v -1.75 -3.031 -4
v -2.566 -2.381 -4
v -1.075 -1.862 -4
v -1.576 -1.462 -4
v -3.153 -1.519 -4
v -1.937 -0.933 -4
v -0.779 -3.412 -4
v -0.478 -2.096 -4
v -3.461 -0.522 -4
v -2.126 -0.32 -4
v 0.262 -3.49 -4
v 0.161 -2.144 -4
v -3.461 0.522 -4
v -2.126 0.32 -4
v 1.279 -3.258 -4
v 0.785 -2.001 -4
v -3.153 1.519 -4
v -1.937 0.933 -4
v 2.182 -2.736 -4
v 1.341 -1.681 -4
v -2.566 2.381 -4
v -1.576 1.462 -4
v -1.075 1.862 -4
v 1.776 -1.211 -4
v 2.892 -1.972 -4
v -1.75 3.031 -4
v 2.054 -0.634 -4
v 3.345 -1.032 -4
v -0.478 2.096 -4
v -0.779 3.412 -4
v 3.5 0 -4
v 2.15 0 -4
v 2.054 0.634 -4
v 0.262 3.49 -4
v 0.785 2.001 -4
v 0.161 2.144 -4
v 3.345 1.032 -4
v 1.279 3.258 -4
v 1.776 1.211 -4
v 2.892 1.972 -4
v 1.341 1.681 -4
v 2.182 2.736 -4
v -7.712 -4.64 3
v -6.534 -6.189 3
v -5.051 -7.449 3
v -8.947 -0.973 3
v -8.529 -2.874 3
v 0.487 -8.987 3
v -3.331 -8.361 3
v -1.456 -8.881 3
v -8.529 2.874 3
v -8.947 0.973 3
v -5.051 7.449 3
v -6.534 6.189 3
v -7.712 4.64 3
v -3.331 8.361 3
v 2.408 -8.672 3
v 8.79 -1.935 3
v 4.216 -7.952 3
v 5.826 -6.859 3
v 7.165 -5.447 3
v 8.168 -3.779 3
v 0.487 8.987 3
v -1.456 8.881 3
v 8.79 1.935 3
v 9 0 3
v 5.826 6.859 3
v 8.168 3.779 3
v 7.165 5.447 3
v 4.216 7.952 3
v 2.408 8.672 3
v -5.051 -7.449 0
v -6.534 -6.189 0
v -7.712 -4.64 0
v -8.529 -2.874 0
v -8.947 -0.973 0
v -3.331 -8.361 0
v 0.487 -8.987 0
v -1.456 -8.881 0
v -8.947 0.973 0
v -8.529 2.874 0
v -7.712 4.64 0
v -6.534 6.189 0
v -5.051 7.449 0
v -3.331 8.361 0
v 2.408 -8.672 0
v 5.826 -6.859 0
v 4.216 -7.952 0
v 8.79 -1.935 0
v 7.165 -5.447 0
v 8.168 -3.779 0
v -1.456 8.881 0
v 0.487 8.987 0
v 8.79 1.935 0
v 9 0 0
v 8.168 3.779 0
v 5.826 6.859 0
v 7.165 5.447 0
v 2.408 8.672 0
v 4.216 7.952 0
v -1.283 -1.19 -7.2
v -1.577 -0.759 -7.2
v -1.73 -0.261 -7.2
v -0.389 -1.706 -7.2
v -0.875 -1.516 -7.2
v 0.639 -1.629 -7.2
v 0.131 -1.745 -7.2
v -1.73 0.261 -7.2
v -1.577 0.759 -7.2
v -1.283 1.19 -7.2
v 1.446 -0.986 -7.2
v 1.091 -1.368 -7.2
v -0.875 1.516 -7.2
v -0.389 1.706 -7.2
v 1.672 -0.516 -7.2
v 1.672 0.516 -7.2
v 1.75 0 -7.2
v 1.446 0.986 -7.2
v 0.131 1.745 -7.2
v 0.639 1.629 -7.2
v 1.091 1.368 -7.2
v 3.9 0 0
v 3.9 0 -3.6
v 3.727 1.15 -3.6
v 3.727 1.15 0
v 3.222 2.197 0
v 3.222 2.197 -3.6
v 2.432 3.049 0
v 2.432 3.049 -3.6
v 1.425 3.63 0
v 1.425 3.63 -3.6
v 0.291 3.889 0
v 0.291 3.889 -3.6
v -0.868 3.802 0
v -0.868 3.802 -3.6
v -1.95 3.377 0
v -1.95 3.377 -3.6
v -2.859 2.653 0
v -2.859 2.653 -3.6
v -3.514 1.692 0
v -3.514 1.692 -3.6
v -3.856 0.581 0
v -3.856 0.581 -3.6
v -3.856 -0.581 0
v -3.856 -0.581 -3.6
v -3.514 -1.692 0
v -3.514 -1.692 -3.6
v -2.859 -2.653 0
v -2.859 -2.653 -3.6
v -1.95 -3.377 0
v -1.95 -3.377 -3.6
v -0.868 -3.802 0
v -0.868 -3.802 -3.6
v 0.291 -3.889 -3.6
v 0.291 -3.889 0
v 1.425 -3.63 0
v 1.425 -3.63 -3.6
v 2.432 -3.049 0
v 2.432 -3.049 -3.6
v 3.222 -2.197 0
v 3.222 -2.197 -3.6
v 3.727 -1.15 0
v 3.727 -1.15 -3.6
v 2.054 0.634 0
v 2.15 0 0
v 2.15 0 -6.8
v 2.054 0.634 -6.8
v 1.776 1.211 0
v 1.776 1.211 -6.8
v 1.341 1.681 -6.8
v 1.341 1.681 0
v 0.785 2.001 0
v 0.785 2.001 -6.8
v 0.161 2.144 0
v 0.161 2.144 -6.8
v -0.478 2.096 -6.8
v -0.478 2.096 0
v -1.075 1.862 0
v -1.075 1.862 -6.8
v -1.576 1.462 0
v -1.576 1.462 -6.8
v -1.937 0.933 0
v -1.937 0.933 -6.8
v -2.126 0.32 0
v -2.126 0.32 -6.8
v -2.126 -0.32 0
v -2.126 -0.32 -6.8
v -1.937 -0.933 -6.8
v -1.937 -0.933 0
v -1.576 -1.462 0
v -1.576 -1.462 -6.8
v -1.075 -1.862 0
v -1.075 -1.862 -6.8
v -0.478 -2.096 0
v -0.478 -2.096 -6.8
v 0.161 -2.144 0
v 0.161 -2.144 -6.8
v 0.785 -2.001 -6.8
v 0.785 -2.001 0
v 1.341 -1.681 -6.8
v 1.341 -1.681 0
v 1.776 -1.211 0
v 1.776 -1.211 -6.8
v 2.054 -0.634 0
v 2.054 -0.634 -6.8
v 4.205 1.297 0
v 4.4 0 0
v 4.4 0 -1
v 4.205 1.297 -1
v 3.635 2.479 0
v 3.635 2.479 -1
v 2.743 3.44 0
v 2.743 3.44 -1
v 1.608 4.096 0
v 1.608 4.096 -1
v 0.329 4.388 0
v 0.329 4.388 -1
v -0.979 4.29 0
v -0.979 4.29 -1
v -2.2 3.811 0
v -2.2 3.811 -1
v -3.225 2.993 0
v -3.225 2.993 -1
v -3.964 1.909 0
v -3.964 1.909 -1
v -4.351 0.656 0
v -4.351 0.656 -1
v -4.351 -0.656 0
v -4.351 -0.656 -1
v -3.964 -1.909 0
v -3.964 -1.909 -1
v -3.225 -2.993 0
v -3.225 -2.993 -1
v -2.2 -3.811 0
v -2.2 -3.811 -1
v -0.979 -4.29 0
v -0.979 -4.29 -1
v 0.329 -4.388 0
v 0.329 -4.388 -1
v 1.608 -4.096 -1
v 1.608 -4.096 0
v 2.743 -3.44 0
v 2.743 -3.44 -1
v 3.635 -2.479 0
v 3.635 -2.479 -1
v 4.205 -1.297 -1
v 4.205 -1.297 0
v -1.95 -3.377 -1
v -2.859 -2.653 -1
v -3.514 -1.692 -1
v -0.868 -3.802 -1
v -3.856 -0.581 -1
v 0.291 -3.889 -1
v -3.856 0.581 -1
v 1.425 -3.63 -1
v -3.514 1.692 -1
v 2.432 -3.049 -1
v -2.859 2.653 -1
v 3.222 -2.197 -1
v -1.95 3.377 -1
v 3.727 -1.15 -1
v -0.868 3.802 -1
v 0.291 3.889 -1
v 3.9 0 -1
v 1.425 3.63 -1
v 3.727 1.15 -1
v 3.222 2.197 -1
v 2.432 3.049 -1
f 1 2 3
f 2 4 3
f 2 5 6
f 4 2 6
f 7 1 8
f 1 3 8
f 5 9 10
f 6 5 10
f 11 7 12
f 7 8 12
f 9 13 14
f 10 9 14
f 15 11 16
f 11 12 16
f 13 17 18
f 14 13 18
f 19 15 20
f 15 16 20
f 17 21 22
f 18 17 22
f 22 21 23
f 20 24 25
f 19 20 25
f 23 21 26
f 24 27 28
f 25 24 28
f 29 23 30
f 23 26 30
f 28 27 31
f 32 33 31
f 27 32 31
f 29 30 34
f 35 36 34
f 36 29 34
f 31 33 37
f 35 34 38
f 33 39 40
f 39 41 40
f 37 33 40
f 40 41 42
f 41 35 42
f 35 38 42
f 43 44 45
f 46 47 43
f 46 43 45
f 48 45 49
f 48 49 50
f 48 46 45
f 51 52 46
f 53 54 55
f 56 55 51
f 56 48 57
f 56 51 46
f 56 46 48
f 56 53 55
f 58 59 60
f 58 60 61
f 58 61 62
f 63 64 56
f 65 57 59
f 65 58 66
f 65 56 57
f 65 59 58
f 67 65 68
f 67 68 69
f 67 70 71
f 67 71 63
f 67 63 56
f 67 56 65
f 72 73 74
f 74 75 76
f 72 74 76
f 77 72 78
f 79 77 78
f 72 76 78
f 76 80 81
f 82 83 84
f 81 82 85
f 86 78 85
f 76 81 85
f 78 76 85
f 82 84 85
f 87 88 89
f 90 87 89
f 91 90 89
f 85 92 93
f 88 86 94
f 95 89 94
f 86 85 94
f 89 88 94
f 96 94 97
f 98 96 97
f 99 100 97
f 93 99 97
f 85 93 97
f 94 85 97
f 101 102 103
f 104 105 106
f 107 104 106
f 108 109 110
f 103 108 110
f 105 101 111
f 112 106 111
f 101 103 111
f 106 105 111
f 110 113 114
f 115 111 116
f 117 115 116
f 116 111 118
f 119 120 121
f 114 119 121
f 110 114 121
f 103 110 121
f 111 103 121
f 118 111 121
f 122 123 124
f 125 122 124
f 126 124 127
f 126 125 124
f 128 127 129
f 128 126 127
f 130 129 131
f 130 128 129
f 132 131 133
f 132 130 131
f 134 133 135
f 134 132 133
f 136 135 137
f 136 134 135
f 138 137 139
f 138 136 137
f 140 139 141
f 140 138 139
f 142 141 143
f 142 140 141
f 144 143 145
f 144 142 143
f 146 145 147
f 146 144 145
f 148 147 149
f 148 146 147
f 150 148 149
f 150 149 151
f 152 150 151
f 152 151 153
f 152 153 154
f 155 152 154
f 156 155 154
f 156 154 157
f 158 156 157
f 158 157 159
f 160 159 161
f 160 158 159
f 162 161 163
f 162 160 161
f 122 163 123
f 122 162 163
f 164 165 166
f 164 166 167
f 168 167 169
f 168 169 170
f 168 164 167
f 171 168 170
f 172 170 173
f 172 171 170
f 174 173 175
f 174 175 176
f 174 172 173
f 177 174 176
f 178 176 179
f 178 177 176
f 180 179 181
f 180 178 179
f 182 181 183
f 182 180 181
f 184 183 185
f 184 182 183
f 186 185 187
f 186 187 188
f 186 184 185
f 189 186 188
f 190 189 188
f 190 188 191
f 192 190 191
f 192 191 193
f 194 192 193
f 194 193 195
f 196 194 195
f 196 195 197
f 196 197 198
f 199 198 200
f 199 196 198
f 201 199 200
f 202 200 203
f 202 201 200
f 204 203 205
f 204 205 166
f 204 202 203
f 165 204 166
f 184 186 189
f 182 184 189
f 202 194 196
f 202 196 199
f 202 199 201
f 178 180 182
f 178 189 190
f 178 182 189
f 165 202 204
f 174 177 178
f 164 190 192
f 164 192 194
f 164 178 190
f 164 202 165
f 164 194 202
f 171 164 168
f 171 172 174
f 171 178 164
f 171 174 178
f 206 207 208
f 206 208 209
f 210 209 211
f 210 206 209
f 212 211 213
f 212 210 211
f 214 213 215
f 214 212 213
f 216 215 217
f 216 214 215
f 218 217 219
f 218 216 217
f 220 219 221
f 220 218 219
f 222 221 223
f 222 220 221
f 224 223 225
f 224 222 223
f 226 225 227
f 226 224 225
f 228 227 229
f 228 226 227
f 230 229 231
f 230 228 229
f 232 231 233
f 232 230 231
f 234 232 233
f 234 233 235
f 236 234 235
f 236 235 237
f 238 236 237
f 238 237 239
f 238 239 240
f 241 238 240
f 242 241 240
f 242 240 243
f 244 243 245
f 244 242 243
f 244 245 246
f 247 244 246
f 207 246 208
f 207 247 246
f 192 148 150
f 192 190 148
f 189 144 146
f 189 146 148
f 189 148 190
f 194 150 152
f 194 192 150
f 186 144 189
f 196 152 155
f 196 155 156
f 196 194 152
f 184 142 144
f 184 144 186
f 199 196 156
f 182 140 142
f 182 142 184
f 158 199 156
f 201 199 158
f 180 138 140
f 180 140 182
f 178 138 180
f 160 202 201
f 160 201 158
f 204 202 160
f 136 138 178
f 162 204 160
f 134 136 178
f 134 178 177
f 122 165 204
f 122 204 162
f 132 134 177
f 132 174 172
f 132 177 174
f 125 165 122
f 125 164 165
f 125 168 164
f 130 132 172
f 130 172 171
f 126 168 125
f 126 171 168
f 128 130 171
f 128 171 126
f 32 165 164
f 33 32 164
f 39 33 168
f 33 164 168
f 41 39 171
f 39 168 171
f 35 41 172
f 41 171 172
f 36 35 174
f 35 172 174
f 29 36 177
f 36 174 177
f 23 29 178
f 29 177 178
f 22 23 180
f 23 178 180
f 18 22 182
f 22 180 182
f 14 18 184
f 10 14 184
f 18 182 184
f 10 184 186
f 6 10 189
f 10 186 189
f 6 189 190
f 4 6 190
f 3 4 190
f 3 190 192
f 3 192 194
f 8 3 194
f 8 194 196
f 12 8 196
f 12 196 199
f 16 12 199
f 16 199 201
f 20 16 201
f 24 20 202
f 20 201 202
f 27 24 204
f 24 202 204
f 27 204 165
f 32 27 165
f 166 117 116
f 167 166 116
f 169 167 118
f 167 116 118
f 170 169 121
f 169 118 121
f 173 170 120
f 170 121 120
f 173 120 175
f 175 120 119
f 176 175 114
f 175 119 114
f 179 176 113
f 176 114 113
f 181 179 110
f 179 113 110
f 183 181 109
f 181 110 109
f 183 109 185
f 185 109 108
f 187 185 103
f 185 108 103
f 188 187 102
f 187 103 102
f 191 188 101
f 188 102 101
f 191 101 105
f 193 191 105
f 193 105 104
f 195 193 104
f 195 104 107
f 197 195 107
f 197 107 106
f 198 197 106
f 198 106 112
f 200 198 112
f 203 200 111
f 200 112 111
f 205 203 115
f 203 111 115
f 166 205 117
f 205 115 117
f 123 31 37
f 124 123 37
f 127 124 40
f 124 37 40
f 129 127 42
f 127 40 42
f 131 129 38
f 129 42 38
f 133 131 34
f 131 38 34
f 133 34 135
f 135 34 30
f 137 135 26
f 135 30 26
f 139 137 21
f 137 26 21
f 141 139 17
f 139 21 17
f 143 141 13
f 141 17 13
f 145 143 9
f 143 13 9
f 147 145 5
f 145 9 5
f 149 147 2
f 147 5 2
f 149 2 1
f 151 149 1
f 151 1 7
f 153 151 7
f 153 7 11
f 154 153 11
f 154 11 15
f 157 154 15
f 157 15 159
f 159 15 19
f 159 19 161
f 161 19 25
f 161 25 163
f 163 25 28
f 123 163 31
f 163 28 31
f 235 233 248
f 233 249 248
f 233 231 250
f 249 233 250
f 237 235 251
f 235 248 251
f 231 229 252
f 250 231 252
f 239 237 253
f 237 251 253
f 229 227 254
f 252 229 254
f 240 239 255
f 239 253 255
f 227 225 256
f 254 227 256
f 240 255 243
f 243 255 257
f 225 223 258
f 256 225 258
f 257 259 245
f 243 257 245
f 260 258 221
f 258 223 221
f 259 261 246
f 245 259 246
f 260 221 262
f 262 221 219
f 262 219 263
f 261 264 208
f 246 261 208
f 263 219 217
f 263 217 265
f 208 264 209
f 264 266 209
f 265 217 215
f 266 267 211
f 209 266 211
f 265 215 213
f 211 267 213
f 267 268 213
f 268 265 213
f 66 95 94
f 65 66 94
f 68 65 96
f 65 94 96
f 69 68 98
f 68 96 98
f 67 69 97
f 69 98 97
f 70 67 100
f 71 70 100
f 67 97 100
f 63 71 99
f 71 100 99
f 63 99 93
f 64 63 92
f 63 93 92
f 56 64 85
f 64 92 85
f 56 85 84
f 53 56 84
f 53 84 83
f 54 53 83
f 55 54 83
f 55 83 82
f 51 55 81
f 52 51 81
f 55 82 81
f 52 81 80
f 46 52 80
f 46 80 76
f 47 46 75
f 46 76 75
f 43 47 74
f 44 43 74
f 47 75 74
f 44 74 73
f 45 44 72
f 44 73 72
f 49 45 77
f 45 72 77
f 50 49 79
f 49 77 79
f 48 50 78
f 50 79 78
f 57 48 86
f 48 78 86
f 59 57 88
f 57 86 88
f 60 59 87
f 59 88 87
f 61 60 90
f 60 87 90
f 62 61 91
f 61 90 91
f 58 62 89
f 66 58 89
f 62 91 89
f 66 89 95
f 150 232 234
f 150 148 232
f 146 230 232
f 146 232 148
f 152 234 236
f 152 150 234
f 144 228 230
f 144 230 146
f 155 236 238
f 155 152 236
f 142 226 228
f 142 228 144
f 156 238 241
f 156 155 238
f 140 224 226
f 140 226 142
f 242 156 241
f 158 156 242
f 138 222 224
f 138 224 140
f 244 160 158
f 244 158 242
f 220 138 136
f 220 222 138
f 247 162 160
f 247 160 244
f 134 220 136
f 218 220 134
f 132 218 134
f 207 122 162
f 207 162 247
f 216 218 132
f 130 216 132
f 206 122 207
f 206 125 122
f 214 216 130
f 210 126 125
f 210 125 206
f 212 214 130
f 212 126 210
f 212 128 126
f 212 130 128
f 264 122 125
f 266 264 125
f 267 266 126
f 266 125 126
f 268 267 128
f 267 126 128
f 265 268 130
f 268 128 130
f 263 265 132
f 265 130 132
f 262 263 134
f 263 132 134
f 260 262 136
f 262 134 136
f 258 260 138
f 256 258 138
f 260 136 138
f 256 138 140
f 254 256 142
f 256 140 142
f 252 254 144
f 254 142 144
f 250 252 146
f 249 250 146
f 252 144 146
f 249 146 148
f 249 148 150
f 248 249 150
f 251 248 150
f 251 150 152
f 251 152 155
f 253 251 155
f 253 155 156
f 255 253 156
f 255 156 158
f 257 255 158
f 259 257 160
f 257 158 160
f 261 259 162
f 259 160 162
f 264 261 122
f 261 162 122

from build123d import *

# Parameters (mm, degrees)
F0_R      = 4.4
F0_R_2    = 3.9
F1_DEPTH  = 1
F0_R_3    = 2.15
F2_DEPTH  = 4
F3_DEPTH  = 7.2
F4_SIZE   = 0.4
F4_2_SIZE = 0.4
F0_R_4    = 9
F5_DEPTH  = 3


with BuildPart() as f1:
    # F0 (on Top) → F1 (new body)
    with BuildSketch(Plane.XY):
        Circle(F0_R)
        Circle(F0_R_2, mode=Mode.SUBTRACT)
    extrude(amount=-F1_DEPTH)


with BuildPart() as f2:
    # F0 (on Top) → F2 (new body)
    with BuildSketch(Plane.XY):
        Circle(F0_R_2)
        Circle(F0_R_3, mode=Mode.SUBTRACT)
    extrude(amount=-F2_DEPTH)

    # F4#2
    f4_2_edges = [f2.edges().sort_by_distance(p)[0] for p in [
        (-3.9, 0, -4),
    ]]
    chamfer(f4_2_edges, length=F4_2_SIZE)


with BuildPart() as f3:
    # F0 (on Top) → F3 (new body)
    with BuildSketch(Plane.XY):
        Circle(F0_R_3)
    extrude(amount=-F3_DEPTH)

    # F4
    f4_edges = [f3.edges().sort_by_distance(p)[0] for p in [
        (-2.15, 0, -7.2),
    ]]
    chamfer(f4_edges, length=F4_SIZE)


with BuildPart() as f5:
    # F0 (on Top) → F5 (new body)
    with BuildSketch(Plane.XY):
        Circle(F0_R_4)
        Circle(F0_R, mode=Mode.SUBTRACT)
        Circle(F0_R)
        Circle(F0_R_2, mode=Mode.SUBTRACT)
        Circle(F0_R_2)
        Circle(F0_R_3, mode=Mode.SUBTRACT)
        Circle(F0_R_3)
    extrude(amount=F5_DEPTH)


solid = Compound([f1.part, f2.part, f3.part, f5.part])
